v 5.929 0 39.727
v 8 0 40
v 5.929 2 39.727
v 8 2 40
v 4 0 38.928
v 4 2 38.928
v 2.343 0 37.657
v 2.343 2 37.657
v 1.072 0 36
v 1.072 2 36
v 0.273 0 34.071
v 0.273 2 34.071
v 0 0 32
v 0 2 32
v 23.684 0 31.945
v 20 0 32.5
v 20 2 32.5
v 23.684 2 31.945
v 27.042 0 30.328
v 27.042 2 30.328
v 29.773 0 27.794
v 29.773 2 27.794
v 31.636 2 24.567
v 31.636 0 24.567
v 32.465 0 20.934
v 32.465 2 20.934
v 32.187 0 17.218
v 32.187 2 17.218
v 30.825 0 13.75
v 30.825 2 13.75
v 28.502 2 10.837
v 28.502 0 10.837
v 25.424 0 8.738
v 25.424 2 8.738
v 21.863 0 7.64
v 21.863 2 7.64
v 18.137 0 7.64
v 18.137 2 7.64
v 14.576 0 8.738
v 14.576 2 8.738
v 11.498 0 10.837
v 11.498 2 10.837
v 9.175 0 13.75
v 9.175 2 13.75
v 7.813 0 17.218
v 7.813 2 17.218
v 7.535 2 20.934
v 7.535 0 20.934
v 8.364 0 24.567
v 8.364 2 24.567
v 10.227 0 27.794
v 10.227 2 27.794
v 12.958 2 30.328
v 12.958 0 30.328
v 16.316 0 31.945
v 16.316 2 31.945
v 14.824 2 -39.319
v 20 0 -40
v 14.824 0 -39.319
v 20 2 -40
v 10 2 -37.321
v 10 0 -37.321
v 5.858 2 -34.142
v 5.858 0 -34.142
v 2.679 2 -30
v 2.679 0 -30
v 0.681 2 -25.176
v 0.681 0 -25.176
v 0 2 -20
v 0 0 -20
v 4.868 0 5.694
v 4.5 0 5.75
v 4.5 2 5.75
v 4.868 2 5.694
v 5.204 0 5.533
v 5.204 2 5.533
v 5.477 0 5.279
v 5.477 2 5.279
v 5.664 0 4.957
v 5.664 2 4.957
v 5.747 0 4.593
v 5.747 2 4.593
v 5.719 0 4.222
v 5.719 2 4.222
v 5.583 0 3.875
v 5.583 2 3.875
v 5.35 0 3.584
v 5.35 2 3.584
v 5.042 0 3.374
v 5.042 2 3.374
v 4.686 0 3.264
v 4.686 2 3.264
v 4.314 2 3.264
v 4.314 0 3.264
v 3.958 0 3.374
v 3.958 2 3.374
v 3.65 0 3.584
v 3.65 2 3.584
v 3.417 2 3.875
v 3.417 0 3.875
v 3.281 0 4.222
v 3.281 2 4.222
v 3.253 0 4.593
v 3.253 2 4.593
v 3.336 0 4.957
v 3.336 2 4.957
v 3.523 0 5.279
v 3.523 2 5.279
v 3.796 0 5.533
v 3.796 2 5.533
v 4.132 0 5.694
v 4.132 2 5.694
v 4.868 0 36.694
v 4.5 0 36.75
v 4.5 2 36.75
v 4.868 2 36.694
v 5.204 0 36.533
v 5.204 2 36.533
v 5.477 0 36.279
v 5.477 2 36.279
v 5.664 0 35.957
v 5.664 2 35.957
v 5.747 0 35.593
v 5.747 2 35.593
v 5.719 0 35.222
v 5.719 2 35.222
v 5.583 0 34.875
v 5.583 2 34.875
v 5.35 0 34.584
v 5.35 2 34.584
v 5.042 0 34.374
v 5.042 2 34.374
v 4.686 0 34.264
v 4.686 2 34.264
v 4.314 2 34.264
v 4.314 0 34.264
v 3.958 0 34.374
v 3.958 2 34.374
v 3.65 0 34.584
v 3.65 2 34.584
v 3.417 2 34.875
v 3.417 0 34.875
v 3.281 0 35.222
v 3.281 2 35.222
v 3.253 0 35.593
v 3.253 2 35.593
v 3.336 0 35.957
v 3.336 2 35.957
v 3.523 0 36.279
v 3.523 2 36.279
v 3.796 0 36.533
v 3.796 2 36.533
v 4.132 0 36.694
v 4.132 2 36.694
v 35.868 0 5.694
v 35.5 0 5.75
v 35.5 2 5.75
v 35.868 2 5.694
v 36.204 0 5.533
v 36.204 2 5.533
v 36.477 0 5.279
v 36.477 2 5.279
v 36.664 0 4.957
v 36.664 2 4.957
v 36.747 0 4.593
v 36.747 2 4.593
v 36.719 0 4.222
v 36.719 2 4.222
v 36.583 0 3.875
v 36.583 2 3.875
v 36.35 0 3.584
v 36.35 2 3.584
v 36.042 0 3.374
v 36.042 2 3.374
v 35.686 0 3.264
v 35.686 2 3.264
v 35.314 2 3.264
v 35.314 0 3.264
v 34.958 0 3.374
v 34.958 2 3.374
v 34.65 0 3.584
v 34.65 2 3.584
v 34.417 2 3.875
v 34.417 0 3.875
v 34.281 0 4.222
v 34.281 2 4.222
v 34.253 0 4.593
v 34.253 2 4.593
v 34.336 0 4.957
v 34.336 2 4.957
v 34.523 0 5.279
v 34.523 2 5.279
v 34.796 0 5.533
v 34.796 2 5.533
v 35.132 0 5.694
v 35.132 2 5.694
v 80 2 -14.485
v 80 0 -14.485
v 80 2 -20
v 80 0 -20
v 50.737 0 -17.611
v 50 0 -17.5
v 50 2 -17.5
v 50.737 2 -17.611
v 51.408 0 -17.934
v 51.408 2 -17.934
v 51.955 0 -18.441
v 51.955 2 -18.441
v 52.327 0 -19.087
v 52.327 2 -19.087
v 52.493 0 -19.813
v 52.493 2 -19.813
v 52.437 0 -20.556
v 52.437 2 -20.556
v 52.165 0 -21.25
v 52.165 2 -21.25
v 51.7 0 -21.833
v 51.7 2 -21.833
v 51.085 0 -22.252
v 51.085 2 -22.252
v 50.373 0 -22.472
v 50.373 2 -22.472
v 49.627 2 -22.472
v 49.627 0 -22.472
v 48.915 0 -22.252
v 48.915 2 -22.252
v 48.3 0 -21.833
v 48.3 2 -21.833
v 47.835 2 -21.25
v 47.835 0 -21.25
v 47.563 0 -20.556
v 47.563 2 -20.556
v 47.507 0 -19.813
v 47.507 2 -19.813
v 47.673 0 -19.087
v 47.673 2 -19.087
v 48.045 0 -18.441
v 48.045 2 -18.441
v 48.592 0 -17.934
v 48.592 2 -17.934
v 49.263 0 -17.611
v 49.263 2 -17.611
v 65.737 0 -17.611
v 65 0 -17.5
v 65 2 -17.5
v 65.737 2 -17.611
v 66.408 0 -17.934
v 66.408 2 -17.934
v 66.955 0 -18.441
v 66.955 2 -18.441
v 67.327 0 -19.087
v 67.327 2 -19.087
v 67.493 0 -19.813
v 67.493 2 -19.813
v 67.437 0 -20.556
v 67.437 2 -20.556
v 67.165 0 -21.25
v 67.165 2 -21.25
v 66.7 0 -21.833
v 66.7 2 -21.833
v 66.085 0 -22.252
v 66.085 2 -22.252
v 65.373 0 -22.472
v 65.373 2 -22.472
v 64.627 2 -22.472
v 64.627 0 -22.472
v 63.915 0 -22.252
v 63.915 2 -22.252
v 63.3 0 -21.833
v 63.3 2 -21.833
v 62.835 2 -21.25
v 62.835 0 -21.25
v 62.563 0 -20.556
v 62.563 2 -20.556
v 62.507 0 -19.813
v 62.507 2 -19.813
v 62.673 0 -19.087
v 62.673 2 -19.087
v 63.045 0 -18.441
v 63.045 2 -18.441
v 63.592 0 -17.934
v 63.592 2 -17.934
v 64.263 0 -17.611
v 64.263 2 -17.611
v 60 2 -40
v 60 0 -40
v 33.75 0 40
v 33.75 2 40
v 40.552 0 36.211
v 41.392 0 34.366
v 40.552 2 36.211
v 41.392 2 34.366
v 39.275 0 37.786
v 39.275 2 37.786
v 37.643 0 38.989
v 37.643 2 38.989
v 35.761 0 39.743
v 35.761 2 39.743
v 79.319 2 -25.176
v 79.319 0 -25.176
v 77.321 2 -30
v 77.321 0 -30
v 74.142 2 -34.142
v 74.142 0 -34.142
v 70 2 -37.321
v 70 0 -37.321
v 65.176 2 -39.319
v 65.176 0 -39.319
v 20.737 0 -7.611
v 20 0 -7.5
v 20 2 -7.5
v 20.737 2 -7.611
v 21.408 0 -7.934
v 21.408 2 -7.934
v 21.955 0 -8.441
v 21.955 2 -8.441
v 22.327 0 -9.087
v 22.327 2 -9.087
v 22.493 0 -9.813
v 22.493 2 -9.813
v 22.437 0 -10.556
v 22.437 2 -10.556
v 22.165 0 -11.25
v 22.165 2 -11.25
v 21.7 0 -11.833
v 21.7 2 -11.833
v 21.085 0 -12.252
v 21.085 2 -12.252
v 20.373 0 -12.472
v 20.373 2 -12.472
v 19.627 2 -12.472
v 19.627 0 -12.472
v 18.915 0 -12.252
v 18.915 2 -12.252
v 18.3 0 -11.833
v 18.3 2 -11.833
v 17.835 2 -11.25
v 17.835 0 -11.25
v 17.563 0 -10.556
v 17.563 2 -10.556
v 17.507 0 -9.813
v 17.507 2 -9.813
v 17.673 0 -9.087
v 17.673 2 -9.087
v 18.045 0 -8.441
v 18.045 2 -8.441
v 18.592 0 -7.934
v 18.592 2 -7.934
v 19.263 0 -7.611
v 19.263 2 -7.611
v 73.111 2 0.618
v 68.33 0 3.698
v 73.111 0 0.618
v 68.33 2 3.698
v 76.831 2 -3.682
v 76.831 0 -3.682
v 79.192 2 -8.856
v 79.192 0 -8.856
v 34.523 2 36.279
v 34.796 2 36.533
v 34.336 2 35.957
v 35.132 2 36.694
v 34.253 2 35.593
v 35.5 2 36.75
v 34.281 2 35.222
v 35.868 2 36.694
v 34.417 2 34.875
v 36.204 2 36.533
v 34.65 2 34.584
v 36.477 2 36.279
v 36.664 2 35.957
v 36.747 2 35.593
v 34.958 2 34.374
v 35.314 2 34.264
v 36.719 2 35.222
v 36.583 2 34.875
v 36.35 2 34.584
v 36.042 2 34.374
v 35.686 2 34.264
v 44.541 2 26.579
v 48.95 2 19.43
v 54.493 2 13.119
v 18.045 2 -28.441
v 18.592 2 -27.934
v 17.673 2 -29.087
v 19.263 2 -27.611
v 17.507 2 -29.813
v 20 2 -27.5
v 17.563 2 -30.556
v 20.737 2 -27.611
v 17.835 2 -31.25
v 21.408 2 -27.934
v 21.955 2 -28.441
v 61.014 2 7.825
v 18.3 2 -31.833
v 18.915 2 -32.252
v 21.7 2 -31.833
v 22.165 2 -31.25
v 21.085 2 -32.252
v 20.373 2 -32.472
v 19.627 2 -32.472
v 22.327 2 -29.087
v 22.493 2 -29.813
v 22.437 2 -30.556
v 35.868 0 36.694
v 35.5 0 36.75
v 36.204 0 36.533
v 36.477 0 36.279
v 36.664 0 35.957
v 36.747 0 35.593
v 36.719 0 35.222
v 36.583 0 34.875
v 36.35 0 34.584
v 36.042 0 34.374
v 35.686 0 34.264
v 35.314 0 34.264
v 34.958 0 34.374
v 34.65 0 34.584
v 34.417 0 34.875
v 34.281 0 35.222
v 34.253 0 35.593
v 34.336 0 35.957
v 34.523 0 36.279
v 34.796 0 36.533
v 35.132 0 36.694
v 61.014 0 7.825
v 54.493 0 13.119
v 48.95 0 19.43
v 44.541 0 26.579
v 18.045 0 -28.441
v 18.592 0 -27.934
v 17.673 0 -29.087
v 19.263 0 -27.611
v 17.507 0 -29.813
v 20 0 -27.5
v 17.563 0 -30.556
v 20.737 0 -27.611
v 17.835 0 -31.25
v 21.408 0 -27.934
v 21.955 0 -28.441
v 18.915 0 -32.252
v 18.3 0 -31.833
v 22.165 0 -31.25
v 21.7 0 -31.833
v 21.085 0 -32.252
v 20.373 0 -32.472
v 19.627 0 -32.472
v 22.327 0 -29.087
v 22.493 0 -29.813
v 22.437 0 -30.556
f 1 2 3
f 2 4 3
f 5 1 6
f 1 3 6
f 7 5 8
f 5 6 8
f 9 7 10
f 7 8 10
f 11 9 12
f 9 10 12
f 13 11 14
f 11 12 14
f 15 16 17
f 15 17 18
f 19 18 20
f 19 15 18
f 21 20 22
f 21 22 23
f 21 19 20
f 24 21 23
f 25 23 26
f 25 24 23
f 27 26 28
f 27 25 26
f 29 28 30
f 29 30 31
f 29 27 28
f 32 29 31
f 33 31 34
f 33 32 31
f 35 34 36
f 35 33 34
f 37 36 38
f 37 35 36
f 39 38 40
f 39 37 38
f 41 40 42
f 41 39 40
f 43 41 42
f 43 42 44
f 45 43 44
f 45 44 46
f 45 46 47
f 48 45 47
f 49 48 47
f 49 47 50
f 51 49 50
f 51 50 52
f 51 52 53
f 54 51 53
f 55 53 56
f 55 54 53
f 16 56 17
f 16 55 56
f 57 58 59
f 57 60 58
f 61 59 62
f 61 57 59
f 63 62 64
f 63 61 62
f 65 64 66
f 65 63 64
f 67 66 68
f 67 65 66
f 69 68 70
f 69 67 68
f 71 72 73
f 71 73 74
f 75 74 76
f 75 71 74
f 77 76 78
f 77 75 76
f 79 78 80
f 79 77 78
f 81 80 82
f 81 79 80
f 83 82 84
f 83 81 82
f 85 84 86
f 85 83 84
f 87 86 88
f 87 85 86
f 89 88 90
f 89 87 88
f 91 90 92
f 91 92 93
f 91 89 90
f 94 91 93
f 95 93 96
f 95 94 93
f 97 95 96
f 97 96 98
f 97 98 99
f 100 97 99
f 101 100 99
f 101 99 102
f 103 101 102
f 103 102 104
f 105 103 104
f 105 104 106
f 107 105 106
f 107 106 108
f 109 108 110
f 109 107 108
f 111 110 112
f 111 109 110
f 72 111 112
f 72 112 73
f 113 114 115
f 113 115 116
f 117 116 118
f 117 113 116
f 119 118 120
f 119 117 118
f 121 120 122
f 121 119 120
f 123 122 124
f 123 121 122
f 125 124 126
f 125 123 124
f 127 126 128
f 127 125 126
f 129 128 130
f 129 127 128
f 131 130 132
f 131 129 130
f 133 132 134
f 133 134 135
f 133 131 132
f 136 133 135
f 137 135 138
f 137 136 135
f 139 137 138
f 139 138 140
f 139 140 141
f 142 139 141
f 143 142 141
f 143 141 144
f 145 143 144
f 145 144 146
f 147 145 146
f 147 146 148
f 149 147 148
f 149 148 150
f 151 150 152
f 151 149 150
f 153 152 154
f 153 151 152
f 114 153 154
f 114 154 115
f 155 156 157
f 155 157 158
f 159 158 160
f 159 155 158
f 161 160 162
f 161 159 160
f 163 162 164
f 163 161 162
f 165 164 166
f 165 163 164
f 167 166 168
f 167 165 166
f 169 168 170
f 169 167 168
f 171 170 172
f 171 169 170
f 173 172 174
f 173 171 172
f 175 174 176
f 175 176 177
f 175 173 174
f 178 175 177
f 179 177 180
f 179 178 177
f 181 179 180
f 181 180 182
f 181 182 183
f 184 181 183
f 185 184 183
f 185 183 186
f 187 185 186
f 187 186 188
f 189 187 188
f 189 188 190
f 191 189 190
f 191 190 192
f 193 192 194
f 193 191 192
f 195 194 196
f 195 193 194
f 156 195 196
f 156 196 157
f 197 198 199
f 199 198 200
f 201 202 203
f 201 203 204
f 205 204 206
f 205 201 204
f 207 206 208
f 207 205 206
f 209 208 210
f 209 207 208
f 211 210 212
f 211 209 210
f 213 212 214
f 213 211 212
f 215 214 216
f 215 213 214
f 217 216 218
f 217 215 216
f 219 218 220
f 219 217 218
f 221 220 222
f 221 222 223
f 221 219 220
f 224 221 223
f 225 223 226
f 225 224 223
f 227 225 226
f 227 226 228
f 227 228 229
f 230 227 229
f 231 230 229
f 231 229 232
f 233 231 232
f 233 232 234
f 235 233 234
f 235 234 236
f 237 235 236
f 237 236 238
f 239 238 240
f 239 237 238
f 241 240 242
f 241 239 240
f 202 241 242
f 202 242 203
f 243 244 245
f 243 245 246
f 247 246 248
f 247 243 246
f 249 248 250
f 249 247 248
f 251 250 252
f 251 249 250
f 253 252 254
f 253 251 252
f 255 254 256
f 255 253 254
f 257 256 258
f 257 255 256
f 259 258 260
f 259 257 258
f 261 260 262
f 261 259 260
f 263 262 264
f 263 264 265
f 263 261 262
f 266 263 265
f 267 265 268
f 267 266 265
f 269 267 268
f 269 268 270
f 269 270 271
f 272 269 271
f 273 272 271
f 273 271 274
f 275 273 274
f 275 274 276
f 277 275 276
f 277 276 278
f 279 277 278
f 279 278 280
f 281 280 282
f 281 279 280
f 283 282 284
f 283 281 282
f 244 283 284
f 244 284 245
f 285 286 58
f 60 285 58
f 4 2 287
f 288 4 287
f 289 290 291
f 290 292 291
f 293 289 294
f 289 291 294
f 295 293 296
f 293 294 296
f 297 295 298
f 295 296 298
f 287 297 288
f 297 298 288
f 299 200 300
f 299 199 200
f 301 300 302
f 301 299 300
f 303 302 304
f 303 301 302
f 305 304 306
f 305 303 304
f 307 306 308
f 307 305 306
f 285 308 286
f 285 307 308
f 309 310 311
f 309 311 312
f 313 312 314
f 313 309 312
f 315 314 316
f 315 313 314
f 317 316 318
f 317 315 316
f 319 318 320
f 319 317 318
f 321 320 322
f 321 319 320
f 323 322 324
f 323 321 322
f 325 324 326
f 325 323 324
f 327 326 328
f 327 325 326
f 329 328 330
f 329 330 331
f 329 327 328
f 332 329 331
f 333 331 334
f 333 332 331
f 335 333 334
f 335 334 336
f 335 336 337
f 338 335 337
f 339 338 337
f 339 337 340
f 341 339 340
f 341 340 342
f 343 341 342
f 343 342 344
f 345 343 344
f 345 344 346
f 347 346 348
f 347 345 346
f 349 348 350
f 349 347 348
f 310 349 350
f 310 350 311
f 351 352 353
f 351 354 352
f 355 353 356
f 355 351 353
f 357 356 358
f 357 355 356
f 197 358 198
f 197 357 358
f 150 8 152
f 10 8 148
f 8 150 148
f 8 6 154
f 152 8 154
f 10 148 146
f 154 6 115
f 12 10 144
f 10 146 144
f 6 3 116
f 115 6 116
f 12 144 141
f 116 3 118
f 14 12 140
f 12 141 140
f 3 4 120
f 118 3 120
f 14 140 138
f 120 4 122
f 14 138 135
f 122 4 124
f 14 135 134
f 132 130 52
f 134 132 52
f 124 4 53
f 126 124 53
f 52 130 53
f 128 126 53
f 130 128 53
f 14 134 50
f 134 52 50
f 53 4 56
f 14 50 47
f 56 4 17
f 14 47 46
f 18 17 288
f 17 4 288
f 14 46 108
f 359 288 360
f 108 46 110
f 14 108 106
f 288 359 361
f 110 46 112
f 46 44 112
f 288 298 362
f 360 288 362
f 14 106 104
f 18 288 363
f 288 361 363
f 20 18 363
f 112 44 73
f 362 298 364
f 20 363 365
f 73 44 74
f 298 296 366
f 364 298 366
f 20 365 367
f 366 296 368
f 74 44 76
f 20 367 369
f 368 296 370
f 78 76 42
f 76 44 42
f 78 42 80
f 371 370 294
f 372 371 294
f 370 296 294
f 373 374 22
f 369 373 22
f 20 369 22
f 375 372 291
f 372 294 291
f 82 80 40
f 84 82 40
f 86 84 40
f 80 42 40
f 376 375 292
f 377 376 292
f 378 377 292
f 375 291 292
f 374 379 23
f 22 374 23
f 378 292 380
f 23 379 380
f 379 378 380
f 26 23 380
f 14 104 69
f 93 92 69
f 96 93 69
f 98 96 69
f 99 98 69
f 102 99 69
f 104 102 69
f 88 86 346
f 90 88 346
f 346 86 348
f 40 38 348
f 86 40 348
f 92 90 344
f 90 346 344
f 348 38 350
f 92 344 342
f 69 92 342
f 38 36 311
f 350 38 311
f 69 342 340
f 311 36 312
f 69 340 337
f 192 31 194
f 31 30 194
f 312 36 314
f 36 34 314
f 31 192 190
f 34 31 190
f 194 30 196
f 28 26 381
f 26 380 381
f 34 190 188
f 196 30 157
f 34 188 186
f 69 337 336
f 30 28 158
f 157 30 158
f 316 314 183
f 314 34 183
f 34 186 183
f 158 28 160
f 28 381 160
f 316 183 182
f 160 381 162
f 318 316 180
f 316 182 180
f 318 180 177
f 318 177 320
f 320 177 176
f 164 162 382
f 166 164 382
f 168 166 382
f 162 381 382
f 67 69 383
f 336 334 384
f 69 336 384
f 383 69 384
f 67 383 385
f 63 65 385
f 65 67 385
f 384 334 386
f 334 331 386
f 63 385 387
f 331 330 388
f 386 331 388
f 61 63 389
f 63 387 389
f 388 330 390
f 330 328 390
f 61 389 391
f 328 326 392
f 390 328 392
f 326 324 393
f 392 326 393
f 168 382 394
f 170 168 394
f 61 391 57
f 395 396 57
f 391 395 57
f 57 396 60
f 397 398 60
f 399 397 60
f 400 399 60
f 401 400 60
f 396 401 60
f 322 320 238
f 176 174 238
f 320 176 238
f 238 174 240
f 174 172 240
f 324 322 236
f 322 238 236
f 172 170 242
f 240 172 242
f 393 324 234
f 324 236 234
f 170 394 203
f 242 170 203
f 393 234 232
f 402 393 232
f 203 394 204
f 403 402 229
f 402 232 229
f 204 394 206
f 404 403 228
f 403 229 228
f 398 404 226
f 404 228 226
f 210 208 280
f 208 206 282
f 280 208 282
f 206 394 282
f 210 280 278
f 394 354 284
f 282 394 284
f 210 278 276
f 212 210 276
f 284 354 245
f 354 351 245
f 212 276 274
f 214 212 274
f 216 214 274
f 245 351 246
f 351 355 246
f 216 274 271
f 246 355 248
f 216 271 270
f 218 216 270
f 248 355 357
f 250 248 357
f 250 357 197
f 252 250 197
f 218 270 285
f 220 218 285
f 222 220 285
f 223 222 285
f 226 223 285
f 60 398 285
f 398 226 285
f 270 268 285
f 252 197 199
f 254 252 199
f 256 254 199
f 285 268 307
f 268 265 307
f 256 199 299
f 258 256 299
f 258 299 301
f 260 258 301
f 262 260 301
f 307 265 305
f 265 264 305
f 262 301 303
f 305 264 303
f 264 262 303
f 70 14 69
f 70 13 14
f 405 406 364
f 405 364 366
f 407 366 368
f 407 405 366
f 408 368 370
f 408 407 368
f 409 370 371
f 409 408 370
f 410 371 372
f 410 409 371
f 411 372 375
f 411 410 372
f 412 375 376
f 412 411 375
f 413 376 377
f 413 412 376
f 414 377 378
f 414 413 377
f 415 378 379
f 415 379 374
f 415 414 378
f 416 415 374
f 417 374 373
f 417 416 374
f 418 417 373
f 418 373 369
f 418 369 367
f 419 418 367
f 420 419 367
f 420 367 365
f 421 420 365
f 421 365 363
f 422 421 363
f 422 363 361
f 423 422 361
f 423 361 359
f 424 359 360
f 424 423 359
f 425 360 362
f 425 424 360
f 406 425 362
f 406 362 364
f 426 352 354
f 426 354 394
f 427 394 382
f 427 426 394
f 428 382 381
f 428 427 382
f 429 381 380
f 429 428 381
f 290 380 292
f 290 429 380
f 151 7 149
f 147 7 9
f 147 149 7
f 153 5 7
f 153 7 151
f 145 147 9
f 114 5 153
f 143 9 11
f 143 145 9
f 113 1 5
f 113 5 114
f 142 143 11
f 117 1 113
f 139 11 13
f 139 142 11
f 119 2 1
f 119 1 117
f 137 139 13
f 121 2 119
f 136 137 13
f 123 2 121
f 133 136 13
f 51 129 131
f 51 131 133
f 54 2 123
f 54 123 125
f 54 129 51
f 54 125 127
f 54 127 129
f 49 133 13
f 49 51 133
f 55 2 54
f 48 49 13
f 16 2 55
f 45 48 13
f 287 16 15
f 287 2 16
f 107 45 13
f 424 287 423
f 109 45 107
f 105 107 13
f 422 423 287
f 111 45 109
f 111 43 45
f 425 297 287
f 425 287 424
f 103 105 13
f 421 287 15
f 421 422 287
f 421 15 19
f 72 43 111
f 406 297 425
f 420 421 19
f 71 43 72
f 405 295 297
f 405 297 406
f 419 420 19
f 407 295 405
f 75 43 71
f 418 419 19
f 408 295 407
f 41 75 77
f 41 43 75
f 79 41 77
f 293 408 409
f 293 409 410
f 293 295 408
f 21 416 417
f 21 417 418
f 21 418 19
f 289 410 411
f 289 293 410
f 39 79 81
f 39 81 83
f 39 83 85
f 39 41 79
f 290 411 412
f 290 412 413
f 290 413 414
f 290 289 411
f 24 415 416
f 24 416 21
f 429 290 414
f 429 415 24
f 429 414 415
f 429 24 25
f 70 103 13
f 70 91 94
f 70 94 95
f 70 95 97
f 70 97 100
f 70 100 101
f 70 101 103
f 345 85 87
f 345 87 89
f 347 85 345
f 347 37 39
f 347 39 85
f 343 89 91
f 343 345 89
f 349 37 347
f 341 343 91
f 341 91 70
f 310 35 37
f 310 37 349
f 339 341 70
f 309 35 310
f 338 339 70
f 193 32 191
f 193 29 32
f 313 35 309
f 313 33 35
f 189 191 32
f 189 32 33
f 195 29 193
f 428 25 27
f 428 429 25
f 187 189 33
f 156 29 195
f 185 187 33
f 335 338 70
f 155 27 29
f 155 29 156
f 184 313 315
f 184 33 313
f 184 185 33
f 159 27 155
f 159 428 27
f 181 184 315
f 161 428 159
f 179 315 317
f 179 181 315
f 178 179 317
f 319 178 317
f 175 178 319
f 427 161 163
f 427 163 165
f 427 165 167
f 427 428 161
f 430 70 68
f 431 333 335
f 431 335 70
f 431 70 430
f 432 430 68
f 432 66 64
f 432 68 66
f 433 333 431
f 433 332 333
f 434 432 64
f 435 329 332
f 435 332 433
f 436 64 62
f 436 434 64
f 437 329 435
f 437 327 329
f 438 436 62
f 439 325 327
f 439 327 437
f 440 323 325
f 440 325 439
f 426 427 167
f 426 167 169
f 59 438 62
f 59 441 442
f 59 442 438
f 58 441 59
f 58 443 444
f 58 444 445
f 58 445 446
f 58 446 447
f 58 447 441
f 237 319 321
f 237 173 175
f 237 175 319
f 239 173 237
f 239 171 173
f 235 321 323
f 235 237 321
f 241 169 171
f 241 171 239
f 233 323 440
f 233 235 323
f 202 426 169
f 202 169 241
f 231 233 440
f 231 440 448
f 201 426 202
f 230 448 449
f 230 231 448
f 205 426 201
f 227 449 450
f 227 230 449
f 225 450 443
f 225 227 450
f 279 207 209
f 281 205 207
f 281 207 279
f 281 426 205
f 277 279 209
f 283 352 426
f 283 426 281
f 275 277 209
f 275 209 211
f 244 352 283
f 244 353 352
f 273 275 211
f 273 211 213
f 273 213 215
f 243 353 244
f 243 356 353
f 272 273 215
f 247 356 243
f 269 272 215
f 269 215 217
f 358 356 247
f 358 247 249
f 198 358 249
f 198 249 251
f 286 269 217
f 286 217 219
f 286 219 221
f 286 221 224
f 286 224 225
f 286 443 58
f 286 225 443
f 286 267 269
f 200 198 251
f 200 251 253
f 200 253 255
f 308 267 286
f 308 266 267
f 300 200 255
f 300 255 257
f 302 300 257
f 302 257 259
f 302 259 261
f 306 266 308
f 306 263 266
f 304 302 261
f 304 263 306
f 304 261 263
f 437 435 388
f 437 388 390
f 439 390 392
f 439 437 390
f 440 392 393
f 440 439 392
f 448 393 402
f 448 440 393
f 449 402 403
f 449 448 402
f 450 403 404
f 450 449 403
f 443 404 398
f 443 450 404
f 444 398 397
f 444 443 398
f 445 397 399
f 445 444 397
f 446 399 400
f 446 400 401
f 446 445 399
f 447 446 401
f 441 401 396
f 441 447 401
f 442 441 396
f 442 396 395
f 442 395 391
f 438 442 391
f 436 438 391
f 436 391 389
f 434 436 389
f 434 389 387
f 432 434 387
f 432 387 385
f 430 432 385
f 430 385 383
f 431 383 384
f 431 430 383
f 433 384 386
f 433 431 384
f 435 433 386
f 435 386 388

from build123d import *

# Parameters (mm, degrees)
SKETCH1_R           = 2.5
SKETCH1_W           = 40
SKETCH1_H           = 40
SKETCH1_R_2         = 1.25
SKETCH1_R_3         = 12.5
BOSS_EXTRUDE1_DEPTH = 2
FILLET1_R           = 50
FILLET2_R           = 20
FILLET3_R           = 8


with BuildPart() as part:
    # Sketch1 → Boss-Extrude1 (new body)
    # profile 1 of 2: a face of its own
    with BuildSketch(Plane(origin=(0, 0, 0), x_dir=(1, 0, 0), z_dir=(0, 1, 0))):
        Polygon((80, 0), (80, 40), (0, 40), (0, 0), (40, 0), align=None)
        with Locations(Location((20, 10, 0), (0, 0, 270))):
            Circle(SKETCH1_R, mode=Mode.SUBTRACT)
        with Locations(Location((20, 30, 0), (0, 0, 270))):
            Circle(SKETCH1_R, mode=Mode.SUBTRACT)
        with Locations(Location((50, 20, 0), (0, 0, 270))):
            Circle(SKETCH1_R, mode=Mode.SUBTRACT)
        with Locations(Location((65, 20, 0), (0, 0, 270))):
            Circle(SKETCH1_R, mode=Mode.SUBTRACT)
    # profile 2 of 2: a face of its own
    with BuildSketch(Plane(origin=(0, 0, 0), x_dir=(1, 0, 0), z_dir=(0, 1, 0))):
        with Locations((20, -20)):
            Rectangle(SKETCH1_W, SKETCH1_H)
        with Locations(Location((4.5, -35.5, 0), (0, 0, 270))):
            Circle(SKETCH1_R_2, mode=Mode.SUBTRACT)
        with Locations(Location((35.5, -35.5, 0), (0, 0, 270))):
            Circle(SKETCH1_R_2, mode=Mode.SUBTRACT)
        with Locations(Location((20, -20, 0), (0, 0, 270))):
            Circle(SKETCH1_R_3, mode=Mode.SUBTRACT)
        with Locations(Location((4.5, -4.5, 0), (0, 0, 270))):
            Circle(SKETCH1_R_2, mode=Mode.SUBTRACT)
        with Locations(Location((35.5, -4.5, 0), (0, 0, 270))):
            Circle(SKETCH1_R_2, mode=Mode.SUBTRACT)
    extrude(amount=BOSS_EXTRUDE1_DEPTH)

    # Fillet1
    # the kernel refuses this fillet: 50 mm, written as the material it adds along each edge
    with BuildSketch(Plane(origin=(40, 0, 0), x_dir=(0, 0, 1), z_dir=(0, 1, 0))) as fillet1_piece_1:
        with BuildLine():
            CenterArc((49.154759474, 49.154759474), FILLET1_R, 190.550098012, 68.899803976)
            Line((0, 40), (0, 0))
            Line((0, 0), (40, 0))
        make_face()
    extrude(amount=2)

    # Fillet2
    fillet2_edges = [part.edges().sort_by_distance(p)[0] for p in [
        (80, 1, -40),
        (80, 1, 0),
        (0, 1, -40),
    ]]
    fillet(fillet2_edges, radius=FILLET2_R)

    # Fillet3
    fillet3_edges = [part.edges().sort_by_distance(p)[0] for p in [
        (40, 1, 40),
        (0, 1, 40),
    ]]
    fillet(fillet3_edges, radius=FILLET3_R)


solid = part.part
